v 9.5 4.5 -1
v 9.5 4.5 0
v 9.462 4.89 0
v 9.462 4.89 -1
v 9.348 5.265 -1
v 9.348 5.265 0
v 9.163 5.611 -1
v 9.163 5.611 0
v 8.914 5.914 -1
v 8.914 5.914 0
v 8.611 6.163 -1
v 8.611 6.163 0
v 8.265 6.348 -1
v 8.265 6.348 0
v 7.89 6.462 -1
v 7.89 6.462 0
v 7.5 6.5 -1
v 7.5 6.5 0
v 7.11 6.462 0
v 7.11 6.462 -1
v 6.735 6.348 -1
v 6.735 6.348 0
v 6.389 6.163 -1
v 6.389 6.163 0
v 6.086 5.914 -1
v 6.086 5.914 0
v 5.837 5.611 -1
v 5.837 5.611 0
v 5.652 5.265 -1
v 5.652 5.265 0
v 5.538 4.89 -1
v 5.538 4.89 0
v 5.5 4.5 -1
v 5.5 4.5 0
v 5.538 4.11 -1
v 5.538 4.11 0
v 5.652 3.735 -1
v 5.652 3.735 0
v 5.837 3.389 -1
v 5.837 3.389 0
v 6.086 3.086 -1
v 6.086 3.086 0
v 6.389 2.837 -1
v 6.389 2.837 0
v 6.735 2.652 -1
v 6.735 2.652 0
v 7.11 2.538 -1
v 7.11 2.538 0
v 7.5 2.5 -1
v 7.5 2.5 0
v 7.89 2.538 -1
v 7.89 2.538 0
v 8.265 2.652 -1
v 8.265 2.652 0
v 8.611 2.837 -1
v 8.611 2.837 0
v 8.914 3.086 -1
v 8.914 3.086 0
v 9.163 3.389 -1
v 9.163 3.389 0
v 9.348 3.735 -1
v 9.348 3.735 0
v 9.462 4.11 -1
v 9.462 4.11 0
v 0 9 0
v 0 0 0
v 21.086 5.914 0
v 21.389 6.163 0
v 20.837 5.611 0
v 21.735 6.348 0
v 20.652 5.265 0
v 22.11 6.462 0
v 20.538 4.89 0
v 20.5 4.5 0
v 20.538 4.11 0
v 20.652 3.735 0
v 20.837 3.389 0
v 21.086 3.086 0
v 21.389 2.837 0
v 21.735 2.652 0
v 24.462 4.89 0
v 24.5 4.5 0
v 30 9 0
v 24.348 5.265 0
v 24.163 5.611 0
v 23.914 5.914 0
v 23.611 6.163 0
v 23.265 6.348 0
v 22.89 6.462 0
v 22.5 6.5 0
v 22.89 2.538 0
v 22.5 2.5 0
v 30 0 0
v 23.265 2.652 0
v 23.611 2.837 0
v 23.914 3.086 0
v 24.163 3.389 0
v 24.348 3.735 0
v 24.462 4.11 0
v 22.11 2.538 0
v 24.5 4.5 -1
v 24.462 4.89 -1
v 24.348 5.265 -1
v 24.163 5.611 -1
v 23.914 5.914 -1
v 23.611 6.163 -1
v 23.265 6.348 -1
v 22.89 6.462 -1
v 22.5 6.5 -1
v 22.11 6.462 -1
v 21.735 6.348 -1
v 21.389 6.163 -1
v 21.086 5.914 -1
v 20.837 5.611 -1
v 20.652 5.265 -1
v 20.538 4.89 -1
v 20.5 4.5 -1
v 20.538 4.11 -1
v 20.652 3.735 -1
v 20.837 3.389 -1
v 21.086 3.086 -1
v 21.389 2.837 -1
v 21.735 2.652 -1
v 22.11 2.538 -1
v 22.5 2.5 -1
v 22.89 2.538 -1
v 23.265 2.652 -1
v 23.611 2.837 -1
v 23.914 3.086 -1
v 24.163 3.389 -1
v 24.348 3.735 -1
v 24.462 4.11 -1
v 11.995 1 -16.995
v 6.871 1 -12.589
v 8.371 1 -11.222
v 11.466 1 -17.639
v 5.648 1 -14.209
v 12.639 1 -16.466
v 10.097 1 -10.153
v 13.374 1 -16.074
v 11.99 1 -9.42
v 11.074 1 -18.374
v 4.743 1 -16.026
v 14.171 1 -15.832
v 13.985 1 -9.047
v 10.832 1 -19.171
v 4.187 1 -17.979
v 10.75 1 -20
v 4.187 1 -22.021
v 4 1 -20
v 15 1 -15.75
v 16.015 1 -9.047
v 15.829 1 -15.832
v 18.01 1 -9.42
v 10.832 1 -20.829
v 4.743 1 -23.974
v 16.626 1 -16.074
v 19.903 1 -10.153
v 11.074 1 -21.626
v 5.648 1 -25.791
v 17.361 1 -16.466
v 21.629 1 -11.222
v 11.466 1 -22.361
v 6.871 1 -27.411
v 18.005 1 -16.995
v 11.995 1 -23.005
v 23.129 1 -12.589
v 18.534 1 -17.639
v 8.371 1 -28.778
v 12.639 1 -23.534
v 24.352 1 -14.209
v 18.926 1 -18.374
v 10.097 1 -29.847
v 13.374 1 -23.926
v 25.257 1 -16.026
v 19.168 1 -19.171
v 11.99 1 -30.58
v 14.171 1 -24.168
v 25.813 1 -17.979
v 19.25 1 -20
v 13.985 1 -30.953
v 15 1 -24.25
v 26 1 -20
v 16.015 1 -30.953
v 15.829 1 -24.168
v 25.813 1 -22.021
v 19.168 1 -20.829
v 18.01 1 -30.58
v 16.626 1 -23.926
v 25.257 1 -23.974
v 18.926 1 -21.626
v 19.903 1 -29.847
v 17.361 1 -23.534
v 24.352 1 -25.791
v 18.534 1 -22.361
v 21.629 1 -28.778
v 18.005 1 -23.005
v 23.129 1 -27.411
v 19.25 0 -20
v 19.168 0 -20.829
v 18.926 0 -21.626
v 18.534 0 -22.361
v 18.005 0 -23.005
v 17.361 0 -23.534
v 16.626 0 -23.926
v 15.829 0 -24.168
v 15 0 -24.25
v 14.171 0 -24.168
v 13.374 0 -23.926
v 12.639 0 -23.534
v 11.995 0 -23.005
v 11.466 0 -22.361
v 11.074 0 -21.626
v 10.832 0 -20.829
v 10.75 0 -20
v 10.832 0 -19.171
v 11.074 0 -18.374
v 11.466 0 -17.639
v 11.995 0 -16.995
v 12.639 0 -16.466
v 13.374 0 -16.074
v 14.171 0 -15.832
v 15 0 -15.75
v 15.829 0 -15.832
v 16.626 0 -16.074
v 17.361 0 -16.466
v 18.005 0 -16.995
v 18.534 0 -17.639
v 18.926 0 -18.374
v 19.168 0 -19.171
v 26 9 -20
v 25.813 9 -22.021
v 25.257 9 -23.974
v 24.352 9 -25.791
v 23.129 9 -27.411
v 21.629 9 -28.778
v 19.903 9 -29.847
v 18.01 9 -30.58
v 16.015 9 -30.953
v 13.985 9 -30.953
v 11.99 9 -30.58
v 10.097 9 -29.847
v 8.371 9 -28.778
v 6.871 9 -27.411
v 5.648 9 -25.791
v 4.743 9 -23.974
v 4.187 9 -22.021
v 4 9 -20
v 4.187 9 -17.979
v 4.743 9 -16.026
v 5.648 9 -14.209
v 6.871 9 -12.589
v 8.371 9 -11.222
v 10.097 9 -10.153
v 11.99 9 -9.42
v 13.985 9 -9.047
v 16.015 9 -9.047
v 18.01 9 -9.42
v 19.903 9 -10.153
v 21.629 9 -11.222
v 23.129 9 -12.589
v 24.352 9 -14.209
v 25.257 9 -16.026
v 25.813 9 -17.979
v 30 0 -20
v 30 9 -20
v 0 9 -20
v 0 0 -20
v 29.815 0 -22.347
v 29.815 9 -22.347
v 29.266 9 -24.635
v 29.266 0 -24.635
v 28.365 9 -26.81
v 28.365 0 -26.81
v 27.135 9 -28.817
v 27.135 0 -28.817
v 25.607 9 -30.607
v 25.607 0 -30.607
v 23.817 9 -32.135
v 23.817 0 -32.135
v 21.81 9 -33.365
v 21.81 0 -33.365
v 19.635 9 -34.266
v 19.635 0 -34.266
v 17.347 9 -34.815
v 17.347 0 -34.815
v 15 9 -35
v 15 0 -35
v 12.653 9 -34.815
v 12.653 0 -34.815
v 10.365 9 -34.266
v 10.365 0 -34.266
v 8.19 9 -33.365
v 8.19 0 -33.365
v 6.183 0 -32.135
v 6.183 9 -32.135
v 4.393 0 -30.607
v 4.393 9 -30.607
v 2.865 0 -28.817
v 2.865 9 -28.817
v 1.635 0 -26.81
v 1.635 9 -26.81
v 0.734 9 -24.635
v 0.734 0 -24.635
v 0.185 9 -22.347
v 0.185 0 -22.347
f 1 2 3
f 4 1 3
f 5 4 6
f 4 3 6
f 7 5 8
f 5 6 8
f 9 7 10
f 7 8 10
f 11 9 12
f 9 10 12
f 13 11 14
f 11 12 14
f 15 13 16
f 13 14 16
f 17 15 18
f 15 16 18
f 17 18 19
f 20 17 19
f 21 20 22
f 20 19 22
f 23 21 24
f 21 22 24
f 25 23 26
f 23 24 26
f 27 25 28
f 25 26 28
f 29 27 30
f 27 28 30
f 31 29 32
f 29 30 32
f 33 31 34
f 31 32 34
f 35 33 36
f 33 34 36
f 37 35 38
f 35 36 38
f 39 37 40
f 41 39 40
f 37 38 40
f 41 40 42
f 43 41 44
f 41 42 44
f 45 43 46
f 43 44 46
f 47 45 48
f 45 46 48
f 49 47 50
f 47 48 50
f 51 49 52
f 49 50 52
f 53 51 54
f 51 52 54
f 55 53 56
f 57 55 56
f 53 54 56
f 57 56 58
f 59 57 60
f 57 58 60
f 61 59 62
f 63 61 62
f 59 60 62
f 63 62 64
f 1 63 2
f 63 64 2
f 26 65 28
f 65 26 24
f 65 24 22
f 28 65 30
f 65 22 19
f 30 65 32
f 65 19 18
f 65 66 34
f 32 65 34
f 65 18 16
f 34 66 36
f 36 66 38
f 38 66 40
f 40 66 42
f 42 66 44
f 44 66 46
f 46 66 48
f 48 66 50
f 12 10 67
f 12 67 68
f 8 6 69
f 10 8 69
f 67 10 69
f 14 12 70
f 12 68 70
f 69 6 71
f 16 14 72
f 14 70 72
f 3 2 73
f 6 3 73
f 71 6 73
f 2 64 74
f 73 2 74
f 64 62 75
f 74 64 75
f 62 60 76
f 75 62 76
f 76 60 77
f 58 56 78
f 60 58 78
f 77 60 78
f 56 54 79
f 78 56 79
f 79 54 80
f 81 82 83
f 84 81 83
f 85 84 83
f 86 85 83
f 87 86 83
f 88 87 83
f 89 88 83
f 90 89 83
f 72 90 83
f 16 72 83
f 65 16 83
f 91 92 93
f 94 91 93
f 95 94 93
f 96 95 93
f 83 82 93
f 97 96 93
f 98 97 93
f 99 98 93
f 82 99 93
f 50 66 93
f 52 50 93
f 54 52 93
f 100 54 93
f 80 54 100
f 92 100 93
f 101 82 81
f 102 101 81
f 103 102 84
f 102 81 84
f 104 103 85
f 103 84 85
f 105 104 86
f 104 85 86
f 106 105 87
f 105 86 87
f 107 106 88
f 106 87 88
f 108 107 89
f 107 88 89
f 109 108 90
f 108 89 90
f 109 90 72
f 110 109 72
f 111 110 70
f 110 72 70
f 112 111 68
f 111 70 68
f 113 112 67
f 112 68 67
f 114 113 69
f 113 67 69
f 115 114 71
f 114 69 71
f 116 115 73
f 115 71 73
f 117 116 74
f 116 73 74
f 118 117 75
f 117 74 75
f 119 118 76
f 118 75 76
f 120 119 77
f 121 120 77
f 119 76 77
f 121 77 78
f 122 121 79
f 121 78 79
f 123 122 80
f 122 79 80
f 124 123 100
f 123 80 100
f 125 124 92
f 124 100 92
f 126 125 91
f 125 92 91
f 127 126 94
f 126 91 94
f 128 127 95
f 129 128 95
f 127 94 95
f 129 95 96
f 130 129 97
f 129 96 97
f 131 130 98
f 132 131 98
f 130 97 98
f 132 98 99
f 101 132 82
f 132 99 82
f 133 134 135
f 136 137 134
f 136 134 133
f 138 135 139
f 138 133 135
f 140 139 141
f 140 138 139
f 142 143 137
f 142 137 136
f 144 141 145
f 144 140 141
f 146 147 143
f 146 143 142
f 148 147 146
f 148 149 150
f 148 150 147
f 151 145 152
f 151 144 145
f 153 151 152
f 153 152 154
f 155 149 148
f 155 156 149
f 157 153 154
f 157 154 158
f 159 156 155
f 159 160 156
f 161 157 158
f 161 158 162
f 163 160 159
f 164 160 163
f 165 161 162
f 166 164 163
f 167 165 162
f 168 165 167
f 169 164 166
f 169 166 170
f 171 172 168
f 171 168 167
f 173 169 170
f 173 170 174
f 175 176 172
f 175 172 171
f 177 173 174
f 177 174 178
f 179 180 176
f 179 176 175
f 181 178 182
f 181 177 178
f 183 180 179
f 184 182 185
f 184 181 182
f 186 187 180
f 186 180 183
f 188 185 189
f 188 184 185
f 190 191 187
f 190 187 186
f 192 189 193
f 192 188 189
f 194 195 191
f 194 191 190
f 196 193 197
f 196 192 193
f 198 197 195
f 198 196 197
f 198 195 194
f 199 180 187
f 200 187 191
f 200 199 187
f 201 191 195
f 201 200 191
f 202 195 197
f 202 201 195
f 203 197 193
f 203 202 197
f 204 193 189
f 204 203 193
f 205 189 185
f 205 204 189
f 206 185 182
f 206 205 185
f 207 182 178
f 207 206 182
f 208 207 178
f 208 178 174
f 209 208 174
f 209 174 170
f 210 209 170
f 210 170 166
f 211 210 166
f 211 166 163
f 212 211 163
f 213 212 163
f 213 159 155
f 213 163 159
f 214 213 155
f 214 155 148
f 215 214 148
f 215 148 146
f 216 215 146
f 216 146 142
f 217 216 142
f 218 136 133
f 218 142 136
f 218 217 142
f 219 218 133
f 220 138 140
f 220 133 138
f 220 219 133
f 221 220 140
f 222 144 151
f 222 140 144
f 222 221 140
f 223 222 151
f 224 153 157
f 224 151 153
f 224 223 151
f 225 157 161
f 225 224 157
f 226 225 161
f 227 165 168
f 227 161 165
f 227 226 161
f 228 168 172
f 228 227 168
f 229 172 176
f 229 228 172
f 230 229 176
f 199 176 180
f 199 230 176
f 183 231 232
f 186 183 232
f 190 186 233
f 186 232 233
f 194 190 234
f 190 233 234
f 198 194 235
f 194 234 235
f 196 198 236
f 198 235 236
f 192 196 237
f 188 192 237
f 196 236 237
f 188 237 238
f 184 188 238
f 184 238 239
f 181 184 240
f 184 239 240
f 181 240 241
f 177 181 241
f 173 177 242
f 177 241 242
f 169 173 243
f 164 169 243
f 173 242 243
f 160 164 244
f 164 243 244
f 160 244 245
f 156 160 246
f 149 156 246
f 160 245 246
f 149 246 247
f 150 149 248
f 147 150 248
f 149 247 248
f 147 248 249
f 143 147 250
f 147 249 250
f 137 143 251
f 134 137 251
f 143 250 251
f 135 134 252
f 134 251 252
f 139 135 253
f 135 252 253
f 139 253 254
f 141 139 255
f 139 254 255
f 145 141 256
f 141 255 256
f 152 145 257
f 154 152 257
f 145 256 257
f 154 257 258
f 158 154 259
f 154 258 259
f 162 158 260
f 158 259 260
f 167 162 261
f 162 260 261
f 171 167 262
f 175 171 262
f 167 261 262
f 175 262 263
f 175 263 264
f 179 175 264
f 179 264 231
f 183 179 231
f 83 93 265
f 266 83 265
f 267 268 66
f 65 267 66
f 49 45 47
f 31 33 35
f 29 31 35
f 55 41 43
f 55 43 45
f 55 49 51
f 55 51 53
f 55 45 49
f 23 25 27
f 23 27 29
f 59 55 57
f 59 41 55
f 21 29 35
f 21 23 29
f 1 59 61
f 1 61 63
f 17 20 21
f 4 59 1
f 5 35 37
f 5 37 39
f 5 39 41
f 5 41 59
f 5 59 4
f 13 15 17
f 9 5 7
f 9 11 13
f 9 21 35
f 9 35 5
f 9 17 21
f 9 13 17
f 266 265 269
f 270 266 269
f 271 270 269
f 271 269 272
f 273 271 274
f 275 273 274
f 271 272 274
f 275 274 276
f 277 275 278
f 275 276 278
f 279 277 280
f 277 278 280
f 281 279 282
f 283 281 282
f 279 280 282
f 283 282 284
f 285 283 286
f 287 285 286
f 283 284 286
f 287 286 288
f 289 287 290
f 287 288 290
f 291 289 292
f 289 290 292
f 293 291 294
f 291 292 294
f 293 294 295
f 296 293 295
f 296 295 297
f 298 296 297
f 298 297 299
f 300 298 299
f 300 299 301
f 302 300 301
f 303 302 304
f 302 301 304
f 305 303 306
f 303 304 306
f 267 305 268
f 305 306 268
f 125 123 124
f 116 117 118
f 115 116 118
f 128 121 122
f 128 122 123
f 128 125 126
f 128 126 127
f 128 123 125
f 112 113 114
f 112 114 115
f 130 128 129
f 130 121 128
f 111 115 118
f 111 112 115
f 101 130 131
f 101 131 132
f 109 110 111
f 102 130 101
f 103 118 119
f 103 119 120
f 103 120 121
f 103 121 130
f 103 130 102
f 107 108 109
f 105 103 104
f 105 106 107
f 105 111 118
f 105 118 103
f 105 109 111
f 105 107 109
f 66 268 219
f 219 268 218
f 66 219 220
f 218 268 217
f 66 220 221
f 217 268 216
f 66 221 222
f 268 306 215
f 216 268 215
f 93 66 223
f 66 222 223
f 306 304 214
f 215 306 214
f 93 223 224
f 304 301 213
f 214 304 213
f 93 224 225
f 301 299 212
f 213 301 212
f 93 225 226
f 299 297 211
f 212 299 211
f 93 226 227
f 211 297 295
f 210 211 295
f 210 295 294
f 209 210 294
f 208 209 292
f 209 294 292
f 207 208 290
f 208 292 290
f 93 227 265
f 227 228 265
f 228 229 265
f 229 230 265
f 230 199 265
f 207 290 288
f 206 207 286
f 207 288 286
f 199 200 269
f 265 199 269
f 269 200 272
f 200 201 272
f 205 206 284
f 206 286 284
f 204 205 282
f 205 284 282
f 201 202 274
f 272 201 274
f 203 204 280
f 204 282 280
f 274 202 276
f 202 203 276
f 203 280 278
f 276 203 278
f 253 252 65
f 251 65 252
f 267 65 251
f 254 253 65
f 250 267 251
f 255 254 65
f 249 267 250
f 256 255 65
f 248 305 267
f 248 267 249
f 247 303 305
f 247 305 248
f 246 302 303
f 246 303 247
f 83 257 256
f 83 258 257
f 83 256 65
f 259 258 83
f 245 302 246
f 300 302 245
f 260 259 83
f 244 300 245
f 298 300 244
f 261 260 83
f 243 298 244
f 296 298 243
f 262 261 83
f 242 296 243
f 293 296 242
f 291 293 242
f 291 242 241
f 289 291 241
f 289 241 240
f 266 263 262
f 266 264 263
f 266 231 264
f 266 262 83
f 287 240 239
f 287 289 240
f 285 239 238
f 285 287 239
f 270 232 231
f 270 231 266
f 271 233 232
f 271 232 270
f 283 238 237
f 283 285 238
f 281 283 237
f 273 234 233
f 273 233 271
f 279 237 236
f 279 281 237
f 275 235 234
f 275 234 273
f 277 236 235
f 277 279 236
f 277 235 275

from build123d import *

# Parameters (mm, degrees)
SKETCH1_R           = 11
SKETCH1_R_2         = 4.25
BOSS_EXTRUDE1_DEPTH = 9
SKETCH2_R           = 11
CUT_EXTRUDE1_DEPTH  = 8
SKETCH4_R           = 2
CUT_EXTRUDE2_DEPTH  = 1


with BuildPart() as part:
    # Sketch1 → Boss-Extrude1 (new body)
    with BuildSketch(Plane(origin=(0, 0, 0), x_dir=(1, 0, 0), z_dir=(0, 1, 0))):
        with BuildLine():
            Line((30, 0), (30, 20))
            ThreePointArc((30, 20), (15, 35), (0, 20))
            Line((0, 20), (0, 0))
            Line((0, 0), (30, 0))
        make_face()
        with Locations((15, 20)):
            Circle(SKETCH1_R, mode=Mode.SUBTRACT)
        with Locations((15, 20)):
            Circle(SKETCH1_R)
        with Locations((15, 20)):
            Circle(SKETCH1_R_2, mode=Mode.SUBTRACT)
    extrude(amount=BOSS_EXTRUDE1_DEPTH)

    # Sketch2 → Cut-Extrude1 (cut)
    with BuildSketch(Plane(origin=(0, 9, 0), x_dir=(1, 0, 0), z_dir=(0, 1, 0))):
        with Locations((15, 20)):
            Circle(SKETCH2_R)
    extrude(amount=-CUT_EXTRUDE1_DEPTH, mode=Mode.SUBTRACT)

    # Sketch4 → Cut-Extrude2 (cut)
    with BuildSketch(Plane.XY):
        with Locations((7.5, 4.5)):
            Circle(SKETCH4_R)
        with Locations((22.5, 4.5)):
            Circle(SKETCH4_R)
    extrude(amount=-CUT_EXTRUDE2_DEPTH, mode=Mode.SUBTRACT)


solid = part.part
